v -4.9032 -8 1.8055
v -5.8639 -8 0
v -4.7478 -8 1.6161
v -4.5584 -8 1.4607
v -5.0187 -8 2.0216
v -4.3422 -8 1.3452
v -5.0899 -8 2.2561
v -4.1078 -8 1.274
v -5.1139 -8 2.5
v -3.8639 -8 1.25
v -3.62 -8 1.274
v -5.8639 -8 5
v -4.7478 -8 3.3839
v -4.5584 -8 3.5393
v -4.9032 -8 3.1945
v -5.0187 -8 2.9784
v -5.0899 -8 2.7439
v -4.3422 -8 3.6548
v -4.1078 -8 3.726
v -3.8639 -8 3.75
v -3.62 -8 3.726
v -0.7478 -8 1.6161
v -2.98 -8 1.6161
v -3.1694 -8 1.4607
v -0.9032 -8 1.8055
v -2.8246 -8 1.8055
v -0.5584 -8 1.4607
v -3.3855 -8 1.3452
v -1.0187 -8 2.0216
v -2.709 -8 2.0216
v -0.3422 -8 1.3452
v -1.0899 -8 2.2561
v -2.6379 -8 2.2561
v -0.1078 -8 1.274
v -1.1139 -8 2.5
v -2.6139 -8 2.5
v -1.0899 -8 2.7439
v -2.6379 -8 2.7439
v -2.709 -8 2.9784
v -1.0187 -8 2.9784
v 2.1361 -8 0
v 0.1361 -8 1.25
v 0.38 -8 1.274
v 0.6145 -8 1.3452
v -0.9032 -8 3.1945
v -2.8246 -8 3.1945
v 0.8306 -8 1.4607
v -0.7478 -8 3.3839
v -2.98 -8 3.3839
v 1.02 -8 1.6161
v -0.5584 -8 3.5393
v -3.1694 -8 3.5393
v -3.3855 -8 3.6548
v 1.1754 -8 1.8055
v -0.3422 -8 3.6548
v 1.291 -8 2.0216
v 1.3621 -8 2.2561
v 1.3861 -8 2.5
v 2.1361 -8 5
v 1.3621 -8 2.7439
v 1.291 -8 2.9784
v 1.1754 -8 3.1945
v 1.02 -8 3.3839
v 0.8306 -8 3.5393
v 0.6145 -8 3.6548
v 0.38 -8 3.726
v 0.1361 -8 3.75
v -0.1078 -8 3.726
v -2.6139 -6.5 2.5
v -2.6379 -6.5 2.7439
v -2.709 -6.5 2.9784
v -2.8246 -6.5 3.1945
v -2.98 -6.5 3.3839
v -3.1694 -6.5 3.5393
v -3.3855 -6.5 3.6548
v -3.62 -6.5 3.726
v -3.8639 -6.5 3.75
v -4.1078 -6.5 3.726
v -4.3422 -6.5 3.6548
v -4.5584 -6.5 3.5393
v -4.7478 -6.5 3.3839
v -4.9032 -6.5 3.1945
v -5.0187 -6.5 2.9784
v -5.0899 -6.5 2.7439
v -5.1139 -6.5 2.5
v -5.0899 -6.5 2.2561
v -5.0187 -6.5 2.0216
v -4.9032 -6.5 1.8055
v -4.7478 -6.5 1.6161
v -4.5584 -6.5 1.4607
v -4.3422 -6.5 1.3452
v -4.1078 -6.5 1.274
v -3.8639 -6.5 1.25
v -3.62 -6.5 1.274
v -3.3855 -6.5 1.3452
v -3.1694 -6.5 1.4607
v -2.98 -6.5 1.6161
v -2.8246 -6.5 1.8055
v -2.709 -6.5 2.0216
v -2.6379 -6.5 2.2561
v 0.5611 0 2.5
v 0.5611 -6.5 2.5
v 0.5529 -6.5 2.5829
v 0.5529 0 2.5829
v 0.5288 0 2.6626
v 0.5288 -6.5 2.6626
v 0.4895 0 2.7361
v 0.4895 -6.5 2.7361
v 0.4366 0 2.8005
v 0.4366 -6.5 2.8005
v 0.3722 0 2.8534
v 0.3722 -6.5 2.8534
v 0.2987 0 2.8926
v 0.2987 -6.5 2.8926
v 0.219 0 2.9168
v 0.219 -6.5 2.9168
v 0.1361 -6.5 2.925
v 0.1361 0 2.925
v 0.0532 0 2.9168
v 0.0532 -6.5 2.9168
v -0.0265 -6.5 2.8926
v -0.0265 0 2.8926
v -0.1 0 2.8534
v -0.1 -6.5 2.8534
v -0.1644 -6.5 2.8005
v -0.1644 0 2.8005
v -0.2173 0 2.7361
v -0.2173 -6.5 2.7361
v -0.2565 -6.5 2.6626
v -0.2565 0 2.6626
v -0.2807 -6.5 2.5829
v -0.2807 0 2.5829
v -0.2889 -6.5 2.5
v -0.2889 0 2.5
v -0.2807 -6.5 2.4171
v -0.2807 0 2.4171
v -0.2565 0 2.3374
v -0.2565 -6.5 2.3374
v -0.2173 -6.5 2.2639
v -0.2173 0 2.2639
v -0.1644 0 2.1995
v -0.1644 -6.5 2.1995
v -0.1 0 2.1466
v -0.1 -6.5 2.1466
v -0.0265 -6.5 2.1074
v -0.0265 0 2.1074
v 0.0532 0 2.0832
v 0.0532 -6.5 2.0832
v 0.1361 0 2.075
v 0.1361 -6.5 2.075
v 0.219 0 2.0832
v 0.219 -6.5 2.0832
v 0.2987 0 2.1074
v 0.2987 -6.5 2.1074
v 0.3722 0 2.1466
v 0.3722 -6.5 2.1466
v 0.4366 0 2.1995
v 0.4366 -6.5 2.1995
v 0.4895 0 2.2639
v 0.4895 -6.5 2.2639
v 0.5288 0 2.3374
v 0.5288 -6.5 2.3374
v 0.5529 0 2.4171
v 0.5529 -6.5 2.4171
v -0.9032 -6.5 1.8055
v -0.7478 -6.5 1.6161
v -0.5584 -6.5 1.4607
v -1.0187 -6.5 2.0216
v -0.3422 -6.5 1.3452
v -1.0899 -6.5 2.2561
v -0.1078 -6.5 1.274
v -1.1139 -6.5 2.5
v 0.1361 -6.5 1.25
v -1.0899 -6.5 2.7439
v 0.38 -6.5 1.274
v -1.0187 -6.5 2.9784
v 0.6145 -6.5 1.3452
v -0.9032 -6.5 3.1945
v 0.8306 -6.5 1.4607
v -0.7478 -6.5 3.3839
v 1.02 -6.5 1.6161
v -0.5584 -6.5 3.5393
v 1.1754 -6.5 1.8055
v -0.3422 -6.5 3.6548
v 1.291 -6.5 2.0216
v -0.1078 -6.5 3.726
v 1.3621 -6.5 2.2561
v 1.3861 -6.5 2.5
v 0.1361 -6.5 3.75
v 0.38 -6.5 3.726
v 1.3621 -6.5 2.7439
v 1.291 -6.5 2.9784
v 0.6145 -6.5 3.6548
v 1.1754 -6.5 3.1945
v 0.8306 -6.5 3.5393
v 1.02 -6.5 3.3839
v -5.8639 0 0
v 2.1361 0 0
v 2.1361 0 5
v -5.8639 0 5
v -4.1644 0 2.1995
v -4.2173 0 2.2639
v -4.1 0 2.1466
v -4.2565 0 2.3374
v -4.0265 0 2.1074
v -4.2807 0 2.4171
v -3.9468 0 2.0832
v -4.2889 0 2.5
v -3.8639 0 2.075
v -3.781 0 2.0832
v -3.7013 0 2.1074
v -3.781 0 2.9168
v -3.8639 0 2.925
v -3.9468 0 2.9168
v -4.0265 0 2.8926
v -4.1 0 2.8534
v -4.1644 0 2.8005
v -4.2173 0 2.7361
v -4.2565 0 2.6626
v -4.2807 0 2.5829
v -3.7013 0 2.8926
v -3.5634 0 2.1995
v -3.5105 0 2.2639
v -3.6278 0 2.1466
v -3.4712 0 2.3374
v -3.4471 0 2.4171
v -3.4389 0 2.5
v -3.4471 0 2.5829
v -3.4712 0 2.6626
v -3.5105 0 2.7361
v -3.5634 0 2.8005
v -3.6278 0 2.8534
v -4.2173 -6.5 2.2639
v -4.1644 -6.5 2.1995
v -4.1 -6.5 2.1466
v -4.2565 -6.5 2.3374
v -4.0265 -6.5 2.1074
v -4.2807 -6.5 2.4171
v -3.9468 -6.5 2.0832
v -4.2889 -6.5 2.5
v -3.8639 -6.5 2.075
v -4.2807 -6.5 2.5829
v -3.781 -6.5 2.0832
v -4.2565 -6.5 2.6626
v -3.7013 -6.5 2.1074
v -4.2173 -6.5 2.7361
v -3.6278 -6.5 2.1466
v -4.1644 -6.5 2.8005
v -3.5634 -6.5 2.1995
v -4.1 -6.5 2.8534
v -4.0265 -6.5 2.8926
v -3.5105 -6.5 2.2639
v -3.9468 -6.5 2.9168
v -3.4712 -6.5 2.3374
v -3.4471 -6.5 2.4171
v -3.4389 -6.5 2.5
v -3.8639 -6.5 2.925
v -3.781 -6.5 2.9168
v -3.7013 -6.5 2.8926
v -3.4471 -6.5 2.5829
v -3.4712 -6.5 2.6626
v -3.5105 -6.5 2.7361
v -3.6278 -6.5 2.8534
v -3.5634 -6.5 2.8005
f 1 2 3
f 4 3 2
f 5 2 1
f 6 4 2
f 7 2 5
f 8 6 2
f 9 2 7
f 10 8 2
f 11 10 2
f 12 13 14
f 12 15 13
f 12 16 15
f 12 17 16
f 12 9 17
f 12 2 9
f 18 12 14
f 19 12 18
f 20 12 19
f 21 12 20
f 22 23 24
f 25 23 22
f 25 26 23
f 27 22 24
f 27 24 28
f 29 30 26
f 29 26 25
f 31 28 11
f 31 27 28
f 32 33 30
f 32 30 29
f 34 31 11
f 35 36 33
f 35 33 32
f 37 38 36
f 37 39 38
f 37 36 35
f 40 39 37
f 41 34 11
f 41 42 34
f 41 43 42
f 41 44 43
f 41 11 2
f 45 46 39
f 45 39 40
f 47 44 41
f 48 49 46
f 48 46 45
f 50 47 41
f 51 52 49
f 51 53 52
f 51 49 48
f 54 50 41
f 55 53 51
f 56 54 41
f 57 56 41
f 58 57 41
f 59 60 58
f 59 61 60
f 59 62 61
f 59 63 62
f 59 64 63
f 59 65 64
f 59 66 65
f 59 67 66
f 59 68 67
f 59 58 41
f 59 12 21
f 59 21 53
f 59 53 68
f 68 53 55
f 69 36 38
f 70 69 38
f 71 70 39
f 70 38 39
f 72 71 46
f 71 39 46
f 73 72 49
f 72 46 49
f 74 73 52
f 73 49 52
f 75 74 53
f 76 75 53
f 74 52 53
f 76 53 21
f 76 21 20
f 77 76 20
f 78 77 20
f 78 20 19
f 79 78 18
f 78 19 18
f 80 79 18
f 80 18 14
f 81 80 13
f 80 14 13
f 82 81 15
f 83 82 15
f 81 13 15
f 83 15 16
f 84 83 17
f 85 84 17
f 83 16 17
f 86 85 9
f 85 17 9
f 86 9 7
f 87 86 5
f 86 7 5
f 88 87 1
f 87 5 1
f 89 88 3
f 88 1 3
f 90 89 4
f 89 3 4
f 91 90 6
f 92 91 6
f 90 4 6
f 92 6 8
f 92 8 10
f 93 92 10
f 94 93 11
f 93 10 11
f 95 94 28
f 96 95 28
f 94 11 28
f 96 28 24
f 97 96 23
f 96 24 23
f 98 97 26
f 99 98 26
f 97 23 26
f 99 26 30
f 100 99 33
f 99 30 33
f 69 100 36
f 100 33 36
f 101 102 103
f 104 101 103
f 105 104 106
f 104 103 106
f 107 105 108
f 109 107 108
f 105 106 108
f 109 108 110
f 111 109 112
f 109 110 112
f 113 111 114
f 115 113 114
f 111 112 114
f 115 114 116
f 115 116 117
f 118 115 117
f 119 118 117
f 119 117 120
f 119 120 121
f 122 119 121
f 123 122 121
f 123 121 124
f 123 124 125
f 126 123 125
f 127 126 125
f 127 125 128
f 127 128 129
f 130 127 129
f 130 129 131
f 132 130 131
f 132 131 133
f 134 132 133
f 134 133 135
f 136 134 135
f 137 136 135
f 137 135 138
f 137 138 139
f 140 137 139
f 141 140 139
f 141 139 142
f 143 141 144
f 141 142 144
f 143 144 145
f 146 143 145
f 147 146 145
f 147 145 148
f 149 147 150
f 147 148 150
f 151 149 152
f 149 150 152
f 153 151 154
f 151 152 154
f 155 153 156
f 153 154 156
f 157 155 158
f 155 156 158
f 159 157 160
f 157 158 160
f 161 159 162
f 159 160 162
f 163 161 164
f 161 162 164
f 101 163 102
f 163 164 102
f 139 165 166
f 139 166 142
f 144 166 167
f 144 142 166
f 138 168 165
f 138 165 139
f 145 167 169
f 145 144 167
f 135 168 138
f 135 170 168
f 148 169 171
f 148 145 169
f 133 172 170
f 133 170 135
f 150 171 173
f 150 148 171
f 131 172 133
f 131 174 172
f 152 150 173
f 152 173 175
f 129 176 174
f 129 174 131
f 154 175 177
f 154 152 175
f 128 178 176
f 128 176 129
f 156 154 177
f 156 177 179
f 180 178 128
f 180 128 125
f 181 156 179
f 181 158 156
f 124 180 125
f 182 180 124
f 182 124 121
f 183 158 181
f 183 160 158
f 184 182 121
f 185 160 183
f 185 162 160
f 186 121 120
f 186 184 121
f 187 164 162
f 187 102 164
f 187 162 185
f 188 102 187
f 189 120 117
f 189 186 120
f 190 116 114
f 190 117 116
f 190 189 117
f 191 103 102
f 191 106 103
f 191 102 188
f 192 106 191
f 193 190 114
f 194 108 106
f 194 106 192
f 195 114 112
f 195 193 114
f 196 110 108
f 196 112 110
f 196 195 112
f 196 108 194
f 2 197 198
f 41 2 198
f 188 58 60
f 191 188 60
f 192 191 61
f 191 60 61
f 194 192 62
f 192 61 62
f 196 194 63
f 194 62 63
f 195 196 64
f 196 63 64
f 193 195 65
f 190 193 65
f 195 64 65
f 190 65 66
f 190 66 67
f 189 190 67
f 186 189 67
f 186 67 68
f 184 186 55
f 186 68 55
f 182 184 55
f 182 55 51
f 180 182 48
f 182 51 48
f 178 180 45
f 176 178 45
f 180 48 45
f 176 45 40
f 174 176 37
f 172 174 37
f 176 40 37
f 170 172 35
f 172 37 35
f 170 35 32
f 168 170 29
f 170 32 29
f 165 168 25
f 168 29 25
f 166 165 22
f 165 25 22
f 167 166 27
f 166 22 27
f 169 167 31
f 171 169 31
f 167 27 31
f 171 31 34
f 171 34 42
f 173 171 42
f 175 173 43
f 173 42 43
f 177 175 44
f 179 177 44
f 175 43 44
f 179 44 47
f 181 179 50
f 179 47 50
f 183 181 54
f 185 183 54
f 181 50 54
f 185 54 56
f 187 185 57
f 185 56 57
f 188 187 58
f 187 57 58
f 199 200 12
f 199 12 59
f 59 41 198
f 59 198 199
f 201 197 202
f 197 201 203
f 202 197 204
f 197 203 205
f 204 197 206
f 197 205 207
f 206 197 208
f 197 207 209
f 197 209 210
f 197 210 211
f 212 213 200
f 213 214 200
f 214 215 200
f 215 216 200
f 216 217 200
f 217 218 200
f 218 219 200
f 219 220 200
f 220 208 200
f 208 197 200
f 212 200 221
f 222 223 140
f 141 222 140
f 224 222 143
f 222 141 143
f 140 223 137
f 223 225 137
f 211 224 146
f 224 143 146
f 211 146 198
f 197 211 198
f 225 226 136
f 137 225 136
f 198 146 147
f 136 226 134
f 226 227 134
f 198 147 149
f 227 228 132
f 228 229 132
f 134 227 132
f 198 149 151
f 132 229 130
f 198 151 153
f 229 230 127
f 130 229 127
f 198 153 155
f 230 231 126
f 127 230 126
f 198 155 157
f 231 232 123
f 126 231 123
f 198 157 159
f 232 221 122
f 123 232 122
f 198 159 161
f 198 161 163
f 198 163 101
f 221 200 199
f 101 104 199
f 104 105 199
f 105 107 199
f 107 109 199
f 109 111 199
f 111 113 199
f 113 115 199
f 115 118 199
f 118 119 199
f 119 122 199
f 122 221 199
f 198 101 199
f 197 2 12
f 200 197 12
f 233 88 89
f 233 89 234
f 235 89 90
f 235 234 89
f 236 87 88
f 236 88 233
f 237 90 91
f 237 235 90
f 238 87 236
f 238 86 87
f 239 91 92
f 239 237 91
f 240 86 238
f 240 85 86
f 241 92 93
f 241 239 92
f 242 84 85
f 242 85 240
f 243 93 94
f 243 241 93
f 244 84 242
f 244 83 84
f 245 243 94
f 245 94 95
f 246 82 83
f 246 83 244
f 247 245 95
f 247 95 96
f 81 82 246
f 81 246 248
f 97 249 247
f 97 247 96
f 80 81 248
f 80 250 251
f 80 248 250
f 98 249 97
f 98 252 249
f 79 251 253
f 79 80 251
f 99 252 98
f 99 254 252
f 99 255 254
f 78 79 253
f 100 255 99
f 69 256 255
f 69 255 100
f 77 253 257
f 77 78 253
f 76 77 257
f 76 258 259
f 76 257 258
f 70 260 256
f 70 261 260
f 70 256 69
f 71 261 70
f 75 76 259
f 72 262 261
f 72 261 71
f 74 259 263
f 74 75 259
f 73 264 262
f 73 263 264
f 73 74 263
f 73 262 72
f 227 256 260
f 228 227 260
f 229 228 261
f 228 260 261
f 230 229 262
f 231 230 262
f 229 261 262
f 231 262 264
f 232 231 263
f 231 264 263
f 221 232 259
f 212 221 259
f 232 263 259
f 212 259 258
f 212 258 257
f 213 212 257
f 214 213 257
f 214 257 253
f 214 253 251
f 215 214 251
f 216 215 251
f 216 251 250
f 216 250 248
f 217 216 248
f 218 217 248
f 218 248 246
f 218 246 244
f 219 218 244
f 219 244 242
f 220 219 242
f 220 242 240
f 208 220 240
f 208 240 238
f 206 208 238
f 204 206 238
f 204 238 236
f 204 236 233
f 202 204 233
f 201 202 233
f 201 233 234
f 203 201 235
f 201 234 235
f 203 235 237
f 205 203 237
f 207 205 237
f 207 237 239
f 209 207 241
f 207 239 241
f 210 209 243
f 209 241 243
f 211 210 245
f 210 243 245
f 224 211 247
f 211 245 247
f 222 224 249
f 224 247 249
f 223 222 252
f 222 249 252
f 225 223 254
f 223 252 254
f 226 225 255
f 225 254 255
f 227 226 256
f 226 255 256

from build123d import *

# Parameters (mm, degrees)
F0_W     = 8
F0_H     = 5
F1_DEPTH = 8
F2_R     = 1.25
F3_DEPTH = 1.5
F4_DEPTH = 1.5
F5_R     = 0.425
F6_DEPTH = 25
F7_DEPTH = 25


with BuildPart() as f1:
    # F0 (on Front) → F1 (new body)
    with BuildSketch(Plane.XZ):
        with Locations((-1.863892, 2.5)):
            Rectangle(F0_W, F0_H)
    extrude(amount=F1_DEPTH)

    # F2 (on face) → F3 (cut)
    with BuildSketch(Plane.XZ.offset(8)):
        with Locations((-3.863892, 2.5)):
            Circle(F2_R)
    extrude(amount=-F3_DEPTH, mode=Mode.SUBTRACT)

    # F2 (on face) → F4 (cut)
    with BuildSketch(Plane.XZ.offset(8)):
        with Locations((0.136108, 2.5)):
            Circle(F2_R)
    extrude(amount=-F4_DEPTH, mode=Mode.SUBTRACT)

    # F5 (on face) → F6 (cut)
    with BuildSketch(Plane.XZ.offset(8)):
        with Locations((0.136108, 2.5)):
            Circle(F5_R)
    extrude(amount=-F6_DEPTH, mode=Mode.SUBTRACT)

    # F5 (on face) → F7 (cut)
    with BuildSketch(Plane.XZ.offset(8)):
        with Locations((-3.863892, 2.5)):
            Circle(F5_R)
        with Locations((0.136108, 2.5)):
            Circle(F5_R)
    extrude(amount=-F7_DEPTH, mode=Mode.SUBTRACT)


solid = f1.part
